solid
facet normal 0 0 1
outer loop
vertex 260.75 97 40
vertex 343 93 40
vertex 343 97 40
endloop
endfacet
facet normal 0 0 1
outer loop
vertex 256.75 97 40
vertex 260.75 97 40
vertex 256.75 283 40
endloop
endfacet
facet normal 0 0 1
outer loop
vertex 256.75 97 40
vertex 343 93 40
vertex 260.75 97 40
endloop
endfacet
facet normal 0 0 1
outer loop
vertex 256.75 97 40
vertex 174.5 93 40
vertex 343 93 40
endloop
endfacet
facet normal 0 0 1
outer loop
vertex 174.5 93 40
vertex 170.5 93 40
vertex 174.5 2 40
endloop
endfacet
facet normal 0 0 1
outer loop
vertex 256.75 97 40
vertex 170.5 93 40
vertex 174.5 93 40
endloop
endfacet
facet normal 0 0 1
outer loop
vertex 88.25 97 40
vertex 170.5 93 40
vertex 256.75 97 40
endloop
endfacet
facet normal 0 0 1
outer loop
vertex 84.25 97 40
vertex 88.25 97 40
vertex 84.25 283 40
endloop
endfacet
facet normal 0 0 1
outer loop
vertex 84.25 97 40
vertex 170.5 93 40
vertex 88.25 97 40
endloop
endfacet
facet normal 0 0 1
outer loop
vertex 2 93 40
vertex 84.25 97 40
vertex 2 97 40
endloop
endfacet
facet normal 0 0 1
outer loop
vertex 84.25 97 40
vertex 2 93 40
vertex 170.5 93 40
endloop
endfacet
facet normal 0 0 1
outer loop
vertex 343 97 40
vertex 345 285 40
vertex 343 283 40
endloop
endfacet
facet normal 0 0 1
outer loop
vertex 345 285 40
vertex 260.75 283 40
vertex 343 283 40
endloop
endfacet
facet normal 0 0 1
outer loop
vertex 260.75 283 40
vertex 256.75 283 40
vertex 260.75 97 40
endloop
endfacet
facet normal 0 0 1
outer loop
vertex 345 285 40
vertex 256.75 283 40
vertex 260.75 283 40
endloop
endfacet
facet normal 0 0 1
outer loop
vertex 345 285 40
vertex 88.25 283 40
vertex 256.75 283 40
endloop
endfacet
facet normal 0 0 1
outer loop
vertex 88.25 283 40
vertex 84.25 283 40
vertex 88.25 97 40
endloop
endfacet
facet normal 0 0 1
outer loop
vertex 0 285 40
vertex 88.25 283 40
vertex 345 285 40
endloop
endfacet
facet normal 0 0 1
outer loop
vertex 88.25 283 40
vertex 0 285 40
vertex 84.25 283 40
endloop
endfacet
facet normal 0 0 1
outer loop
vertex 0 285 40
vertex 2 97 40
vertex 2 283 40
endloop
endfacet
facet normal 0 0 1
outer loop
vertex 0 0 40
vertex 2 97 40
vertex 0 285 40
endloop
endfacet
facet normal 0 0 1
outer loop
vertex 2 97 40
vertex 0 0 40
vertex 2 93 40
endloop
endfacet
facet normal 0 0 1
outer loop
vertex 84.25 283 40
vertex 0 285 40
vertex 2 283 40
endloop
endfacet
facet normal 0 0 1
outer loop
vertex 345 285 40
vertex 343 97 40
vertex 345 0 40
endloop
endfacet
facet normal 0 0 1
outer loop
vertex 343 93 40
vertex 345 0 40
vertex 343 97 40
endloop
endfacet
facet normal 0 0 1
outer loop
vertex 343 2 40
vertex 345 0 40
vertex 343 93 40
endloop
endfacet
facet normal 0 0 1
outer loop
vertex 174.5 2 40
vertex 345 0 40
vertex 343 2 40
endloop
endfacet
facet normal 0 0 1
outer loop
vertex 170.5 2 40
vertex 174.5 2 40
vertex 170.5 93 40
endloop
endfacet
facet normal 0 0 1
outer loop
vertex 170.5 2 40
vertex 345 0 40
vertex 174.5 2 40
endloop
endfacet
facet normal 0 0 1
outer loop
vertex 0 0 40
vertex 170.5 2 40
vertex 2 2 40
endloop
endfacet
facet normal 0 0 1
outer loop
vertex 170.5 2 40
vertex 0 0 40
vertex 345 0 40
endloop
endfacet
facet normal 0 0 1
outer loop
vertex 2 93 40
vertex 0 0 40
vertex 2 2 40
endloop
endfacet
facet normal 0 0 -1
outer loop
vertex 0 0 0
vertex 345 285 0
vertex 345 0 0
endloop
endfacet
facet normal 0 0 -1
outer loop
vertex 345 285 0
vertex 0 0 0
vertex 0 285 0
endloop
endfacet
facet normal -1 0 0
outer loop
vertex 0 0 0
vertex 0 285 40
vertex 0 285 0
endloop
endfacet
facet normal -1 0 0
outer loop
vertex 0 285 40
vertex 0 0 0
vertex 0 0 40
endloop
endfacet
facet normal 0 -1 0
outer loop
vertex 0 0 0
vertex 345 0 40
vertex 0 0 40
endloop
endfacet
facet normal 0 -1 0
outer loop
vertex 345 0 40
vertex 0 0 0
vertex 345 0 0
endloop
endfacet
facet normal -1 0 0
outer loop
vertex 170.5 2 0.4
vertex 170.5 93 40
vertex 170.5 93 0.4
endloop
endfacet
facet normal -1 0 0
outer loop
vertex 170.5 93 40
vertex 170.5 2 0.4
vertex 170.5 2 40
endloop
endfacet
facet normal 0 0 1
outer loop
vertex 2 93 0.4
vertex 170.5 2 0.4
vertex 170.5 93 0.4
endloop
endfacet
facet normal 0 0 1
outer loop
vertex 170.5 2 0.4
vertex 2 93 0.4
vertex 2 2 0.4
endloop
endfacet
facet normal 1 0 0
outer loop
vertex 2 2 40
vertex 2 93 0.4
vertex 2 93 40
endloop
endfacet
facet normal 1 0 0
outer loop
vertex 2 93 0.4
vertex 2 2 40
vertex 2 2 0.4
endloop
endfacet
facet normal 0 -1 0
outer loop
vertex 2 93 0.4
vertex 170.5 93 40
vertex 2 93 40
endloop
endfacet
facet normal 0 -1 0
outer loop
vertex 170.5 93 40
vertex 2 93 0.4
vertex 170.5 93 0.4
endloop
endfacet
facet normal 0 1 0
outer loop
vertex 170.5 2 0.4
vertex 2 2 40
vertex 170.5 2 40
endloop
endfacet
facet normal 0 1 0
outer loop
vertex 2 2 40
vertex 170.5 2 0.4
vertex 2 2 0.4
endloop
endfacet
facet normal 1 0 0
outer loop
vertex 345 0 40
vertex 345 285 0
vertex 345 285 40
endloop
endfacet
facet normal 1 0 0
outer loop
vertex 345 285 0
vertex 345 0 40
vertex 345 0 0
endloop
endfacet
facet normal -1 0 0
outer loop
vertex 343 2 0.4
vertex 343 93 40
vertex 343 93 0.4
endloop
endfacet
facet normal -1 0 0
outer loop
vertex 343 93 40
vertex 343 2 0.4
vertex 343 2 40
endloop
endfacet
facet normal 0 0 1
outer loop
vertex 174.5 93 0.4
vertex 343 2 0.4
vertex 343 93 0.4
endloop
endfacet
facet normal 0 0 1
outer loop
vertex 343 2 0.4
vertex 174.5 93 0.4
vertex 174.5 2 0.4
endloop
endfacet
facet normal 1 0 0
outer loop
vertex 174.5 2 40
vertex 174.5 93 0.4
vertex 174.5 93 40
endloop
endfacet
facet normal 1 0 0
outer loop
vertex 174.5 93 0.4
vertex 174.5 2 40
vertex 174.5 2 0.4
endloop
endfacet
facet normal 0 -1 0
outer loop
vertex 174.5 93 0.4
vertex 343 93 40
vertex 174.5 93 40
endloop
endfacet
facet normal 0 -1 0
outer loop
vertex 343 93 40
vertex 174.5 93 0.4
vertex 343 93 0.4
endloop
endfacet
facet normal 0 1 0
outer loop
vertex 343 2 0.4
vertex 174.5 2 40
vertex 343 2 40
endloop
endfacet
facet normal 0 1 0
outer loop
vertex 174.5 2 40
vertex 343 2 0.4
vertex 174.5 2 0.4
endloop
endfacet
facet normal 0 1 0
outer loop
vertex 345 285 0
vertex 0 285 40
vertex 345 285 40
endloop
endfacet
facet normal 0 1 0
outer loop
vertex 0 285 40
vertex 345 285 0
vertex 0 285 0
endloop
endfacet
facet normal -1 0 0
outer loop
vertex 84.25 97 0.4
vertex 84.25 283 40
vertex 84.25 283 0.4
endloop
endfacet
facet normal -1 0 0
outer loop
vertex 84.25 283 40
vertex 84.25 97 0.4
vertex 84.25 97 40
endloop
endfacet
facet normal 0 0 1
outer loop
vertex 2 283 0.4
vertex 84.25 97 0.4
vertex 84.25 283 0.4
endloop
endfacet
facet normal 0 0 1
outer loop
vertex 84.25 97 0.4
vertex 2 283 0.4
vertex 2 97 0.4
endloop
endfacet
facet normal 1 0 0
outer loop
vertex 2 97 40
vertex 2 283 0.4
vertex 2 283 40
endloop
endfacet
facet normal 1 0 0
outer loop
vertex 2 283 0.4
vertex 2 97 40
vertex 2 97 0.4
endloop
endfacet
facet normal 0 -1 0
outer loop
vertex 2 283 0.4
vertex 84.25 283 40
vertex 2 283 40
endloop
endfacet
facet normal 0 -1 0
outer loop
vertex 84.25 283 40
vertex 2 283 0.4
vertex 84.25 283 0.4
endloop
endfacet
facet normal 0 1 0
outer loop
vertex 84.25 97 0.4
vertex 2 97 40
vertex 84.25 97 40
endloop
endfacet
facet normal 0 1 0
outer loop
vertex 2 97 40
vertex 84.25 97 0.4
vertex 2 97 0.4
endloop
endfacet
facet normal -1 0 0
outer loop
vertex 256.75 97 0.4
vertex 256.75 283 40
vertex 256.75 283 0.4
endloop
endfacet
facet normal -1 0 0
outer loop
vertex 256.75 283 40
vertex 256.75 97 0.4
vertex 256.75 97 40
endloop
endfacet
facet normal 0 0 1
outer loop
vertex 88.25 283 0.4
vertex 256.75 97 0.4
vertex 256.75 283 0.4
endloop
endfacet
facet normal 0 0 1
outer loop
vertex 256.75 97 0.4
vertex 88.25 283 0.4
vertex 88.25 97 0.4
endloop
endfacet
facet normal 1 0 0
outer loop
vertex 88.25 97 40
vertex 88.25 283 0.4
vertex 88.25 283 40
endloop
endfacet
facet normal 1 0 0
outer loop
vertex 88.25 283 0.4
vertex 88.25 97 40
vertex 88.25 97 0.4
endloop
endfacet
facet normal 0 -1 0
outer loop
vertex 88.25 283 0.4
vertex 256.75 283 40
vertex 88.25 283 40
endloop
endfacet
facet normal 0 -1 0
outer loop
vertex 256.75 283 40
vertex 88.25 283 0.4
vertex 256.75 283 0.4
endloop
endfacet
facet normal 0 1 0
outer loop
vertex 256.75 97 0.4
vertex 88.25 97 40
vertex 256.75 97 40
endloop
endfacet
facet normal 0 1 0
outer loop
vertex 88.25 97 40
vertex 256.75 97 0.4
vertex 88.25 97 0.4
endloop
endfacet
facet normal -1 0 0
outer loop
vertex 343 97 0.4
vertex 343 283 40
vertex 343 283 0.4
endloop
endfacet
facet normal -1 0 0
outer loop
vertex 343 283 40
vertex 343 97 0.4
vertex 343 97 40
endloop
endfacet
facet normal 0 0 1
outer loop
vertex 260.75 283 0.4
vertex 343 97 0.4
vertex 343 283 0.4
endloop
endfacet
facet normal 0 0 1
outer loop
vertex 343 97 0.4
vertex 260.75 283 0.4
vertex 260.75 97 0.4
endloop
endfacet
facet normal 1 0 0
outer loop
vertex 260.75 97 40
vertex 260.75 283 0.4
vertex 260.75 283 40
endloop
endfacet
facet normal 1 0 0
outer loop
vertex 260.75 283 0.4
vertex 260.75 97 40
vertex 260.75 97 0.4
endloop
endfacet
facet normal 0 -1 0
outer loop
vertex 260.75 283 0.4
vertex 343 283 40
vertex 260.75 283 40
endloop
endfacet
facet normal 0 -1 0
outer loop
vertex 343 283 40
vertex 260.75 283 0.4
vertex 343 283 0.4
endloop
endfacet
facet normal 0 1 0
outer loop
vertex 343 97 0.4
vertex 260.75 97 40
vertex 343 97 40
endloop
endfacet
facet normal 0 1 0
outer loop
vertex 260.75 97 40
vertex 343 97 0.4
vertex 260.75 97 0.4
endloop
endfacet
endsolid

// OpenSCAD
// file: bins.scad
// Drawer Measurements (frontal perspective)
drawer_width = 345;
drawer_depth = 285;
drawer_height = 40;

module bin(width, depth, wall_thickness, floor_thickness) {
    difference() {
        cube([width, depth, drawer_height]);
        translate([
            wall_thickness, wall_thickness, floor_thickness
        ]) cube([
            width - 2 * wall_thickness,
            depth - 2 * wall_thickness,
            drawer_height - floor_thickness
        ]);
    }
}

bin_width_unit = drawer_width / 4;
bin_depth_unit = drawer_depth / 3;

module unit_bin(width_units, depth_units) {
    bin(
        width_units * bin_width_unit,
        depth_units * bin_depth_unit,
        2,
        0.4
    );
}
// main file
include <bins.scad>

module all_bins() {
    unit_bin(2,1);
    translate([2 * bin_width_unit,0,0]) unit_bin(2,1);
    translate([0,bin_depth_unit,0]) unit_bin(1,2);
    translate([bin_width_unit,bin_depth_unit,0]) unit_bin(2,2);
    translate([3*bin_width_unit,bin_depth_unit,0]) unit_bin(1,2);
}

all_bins();
